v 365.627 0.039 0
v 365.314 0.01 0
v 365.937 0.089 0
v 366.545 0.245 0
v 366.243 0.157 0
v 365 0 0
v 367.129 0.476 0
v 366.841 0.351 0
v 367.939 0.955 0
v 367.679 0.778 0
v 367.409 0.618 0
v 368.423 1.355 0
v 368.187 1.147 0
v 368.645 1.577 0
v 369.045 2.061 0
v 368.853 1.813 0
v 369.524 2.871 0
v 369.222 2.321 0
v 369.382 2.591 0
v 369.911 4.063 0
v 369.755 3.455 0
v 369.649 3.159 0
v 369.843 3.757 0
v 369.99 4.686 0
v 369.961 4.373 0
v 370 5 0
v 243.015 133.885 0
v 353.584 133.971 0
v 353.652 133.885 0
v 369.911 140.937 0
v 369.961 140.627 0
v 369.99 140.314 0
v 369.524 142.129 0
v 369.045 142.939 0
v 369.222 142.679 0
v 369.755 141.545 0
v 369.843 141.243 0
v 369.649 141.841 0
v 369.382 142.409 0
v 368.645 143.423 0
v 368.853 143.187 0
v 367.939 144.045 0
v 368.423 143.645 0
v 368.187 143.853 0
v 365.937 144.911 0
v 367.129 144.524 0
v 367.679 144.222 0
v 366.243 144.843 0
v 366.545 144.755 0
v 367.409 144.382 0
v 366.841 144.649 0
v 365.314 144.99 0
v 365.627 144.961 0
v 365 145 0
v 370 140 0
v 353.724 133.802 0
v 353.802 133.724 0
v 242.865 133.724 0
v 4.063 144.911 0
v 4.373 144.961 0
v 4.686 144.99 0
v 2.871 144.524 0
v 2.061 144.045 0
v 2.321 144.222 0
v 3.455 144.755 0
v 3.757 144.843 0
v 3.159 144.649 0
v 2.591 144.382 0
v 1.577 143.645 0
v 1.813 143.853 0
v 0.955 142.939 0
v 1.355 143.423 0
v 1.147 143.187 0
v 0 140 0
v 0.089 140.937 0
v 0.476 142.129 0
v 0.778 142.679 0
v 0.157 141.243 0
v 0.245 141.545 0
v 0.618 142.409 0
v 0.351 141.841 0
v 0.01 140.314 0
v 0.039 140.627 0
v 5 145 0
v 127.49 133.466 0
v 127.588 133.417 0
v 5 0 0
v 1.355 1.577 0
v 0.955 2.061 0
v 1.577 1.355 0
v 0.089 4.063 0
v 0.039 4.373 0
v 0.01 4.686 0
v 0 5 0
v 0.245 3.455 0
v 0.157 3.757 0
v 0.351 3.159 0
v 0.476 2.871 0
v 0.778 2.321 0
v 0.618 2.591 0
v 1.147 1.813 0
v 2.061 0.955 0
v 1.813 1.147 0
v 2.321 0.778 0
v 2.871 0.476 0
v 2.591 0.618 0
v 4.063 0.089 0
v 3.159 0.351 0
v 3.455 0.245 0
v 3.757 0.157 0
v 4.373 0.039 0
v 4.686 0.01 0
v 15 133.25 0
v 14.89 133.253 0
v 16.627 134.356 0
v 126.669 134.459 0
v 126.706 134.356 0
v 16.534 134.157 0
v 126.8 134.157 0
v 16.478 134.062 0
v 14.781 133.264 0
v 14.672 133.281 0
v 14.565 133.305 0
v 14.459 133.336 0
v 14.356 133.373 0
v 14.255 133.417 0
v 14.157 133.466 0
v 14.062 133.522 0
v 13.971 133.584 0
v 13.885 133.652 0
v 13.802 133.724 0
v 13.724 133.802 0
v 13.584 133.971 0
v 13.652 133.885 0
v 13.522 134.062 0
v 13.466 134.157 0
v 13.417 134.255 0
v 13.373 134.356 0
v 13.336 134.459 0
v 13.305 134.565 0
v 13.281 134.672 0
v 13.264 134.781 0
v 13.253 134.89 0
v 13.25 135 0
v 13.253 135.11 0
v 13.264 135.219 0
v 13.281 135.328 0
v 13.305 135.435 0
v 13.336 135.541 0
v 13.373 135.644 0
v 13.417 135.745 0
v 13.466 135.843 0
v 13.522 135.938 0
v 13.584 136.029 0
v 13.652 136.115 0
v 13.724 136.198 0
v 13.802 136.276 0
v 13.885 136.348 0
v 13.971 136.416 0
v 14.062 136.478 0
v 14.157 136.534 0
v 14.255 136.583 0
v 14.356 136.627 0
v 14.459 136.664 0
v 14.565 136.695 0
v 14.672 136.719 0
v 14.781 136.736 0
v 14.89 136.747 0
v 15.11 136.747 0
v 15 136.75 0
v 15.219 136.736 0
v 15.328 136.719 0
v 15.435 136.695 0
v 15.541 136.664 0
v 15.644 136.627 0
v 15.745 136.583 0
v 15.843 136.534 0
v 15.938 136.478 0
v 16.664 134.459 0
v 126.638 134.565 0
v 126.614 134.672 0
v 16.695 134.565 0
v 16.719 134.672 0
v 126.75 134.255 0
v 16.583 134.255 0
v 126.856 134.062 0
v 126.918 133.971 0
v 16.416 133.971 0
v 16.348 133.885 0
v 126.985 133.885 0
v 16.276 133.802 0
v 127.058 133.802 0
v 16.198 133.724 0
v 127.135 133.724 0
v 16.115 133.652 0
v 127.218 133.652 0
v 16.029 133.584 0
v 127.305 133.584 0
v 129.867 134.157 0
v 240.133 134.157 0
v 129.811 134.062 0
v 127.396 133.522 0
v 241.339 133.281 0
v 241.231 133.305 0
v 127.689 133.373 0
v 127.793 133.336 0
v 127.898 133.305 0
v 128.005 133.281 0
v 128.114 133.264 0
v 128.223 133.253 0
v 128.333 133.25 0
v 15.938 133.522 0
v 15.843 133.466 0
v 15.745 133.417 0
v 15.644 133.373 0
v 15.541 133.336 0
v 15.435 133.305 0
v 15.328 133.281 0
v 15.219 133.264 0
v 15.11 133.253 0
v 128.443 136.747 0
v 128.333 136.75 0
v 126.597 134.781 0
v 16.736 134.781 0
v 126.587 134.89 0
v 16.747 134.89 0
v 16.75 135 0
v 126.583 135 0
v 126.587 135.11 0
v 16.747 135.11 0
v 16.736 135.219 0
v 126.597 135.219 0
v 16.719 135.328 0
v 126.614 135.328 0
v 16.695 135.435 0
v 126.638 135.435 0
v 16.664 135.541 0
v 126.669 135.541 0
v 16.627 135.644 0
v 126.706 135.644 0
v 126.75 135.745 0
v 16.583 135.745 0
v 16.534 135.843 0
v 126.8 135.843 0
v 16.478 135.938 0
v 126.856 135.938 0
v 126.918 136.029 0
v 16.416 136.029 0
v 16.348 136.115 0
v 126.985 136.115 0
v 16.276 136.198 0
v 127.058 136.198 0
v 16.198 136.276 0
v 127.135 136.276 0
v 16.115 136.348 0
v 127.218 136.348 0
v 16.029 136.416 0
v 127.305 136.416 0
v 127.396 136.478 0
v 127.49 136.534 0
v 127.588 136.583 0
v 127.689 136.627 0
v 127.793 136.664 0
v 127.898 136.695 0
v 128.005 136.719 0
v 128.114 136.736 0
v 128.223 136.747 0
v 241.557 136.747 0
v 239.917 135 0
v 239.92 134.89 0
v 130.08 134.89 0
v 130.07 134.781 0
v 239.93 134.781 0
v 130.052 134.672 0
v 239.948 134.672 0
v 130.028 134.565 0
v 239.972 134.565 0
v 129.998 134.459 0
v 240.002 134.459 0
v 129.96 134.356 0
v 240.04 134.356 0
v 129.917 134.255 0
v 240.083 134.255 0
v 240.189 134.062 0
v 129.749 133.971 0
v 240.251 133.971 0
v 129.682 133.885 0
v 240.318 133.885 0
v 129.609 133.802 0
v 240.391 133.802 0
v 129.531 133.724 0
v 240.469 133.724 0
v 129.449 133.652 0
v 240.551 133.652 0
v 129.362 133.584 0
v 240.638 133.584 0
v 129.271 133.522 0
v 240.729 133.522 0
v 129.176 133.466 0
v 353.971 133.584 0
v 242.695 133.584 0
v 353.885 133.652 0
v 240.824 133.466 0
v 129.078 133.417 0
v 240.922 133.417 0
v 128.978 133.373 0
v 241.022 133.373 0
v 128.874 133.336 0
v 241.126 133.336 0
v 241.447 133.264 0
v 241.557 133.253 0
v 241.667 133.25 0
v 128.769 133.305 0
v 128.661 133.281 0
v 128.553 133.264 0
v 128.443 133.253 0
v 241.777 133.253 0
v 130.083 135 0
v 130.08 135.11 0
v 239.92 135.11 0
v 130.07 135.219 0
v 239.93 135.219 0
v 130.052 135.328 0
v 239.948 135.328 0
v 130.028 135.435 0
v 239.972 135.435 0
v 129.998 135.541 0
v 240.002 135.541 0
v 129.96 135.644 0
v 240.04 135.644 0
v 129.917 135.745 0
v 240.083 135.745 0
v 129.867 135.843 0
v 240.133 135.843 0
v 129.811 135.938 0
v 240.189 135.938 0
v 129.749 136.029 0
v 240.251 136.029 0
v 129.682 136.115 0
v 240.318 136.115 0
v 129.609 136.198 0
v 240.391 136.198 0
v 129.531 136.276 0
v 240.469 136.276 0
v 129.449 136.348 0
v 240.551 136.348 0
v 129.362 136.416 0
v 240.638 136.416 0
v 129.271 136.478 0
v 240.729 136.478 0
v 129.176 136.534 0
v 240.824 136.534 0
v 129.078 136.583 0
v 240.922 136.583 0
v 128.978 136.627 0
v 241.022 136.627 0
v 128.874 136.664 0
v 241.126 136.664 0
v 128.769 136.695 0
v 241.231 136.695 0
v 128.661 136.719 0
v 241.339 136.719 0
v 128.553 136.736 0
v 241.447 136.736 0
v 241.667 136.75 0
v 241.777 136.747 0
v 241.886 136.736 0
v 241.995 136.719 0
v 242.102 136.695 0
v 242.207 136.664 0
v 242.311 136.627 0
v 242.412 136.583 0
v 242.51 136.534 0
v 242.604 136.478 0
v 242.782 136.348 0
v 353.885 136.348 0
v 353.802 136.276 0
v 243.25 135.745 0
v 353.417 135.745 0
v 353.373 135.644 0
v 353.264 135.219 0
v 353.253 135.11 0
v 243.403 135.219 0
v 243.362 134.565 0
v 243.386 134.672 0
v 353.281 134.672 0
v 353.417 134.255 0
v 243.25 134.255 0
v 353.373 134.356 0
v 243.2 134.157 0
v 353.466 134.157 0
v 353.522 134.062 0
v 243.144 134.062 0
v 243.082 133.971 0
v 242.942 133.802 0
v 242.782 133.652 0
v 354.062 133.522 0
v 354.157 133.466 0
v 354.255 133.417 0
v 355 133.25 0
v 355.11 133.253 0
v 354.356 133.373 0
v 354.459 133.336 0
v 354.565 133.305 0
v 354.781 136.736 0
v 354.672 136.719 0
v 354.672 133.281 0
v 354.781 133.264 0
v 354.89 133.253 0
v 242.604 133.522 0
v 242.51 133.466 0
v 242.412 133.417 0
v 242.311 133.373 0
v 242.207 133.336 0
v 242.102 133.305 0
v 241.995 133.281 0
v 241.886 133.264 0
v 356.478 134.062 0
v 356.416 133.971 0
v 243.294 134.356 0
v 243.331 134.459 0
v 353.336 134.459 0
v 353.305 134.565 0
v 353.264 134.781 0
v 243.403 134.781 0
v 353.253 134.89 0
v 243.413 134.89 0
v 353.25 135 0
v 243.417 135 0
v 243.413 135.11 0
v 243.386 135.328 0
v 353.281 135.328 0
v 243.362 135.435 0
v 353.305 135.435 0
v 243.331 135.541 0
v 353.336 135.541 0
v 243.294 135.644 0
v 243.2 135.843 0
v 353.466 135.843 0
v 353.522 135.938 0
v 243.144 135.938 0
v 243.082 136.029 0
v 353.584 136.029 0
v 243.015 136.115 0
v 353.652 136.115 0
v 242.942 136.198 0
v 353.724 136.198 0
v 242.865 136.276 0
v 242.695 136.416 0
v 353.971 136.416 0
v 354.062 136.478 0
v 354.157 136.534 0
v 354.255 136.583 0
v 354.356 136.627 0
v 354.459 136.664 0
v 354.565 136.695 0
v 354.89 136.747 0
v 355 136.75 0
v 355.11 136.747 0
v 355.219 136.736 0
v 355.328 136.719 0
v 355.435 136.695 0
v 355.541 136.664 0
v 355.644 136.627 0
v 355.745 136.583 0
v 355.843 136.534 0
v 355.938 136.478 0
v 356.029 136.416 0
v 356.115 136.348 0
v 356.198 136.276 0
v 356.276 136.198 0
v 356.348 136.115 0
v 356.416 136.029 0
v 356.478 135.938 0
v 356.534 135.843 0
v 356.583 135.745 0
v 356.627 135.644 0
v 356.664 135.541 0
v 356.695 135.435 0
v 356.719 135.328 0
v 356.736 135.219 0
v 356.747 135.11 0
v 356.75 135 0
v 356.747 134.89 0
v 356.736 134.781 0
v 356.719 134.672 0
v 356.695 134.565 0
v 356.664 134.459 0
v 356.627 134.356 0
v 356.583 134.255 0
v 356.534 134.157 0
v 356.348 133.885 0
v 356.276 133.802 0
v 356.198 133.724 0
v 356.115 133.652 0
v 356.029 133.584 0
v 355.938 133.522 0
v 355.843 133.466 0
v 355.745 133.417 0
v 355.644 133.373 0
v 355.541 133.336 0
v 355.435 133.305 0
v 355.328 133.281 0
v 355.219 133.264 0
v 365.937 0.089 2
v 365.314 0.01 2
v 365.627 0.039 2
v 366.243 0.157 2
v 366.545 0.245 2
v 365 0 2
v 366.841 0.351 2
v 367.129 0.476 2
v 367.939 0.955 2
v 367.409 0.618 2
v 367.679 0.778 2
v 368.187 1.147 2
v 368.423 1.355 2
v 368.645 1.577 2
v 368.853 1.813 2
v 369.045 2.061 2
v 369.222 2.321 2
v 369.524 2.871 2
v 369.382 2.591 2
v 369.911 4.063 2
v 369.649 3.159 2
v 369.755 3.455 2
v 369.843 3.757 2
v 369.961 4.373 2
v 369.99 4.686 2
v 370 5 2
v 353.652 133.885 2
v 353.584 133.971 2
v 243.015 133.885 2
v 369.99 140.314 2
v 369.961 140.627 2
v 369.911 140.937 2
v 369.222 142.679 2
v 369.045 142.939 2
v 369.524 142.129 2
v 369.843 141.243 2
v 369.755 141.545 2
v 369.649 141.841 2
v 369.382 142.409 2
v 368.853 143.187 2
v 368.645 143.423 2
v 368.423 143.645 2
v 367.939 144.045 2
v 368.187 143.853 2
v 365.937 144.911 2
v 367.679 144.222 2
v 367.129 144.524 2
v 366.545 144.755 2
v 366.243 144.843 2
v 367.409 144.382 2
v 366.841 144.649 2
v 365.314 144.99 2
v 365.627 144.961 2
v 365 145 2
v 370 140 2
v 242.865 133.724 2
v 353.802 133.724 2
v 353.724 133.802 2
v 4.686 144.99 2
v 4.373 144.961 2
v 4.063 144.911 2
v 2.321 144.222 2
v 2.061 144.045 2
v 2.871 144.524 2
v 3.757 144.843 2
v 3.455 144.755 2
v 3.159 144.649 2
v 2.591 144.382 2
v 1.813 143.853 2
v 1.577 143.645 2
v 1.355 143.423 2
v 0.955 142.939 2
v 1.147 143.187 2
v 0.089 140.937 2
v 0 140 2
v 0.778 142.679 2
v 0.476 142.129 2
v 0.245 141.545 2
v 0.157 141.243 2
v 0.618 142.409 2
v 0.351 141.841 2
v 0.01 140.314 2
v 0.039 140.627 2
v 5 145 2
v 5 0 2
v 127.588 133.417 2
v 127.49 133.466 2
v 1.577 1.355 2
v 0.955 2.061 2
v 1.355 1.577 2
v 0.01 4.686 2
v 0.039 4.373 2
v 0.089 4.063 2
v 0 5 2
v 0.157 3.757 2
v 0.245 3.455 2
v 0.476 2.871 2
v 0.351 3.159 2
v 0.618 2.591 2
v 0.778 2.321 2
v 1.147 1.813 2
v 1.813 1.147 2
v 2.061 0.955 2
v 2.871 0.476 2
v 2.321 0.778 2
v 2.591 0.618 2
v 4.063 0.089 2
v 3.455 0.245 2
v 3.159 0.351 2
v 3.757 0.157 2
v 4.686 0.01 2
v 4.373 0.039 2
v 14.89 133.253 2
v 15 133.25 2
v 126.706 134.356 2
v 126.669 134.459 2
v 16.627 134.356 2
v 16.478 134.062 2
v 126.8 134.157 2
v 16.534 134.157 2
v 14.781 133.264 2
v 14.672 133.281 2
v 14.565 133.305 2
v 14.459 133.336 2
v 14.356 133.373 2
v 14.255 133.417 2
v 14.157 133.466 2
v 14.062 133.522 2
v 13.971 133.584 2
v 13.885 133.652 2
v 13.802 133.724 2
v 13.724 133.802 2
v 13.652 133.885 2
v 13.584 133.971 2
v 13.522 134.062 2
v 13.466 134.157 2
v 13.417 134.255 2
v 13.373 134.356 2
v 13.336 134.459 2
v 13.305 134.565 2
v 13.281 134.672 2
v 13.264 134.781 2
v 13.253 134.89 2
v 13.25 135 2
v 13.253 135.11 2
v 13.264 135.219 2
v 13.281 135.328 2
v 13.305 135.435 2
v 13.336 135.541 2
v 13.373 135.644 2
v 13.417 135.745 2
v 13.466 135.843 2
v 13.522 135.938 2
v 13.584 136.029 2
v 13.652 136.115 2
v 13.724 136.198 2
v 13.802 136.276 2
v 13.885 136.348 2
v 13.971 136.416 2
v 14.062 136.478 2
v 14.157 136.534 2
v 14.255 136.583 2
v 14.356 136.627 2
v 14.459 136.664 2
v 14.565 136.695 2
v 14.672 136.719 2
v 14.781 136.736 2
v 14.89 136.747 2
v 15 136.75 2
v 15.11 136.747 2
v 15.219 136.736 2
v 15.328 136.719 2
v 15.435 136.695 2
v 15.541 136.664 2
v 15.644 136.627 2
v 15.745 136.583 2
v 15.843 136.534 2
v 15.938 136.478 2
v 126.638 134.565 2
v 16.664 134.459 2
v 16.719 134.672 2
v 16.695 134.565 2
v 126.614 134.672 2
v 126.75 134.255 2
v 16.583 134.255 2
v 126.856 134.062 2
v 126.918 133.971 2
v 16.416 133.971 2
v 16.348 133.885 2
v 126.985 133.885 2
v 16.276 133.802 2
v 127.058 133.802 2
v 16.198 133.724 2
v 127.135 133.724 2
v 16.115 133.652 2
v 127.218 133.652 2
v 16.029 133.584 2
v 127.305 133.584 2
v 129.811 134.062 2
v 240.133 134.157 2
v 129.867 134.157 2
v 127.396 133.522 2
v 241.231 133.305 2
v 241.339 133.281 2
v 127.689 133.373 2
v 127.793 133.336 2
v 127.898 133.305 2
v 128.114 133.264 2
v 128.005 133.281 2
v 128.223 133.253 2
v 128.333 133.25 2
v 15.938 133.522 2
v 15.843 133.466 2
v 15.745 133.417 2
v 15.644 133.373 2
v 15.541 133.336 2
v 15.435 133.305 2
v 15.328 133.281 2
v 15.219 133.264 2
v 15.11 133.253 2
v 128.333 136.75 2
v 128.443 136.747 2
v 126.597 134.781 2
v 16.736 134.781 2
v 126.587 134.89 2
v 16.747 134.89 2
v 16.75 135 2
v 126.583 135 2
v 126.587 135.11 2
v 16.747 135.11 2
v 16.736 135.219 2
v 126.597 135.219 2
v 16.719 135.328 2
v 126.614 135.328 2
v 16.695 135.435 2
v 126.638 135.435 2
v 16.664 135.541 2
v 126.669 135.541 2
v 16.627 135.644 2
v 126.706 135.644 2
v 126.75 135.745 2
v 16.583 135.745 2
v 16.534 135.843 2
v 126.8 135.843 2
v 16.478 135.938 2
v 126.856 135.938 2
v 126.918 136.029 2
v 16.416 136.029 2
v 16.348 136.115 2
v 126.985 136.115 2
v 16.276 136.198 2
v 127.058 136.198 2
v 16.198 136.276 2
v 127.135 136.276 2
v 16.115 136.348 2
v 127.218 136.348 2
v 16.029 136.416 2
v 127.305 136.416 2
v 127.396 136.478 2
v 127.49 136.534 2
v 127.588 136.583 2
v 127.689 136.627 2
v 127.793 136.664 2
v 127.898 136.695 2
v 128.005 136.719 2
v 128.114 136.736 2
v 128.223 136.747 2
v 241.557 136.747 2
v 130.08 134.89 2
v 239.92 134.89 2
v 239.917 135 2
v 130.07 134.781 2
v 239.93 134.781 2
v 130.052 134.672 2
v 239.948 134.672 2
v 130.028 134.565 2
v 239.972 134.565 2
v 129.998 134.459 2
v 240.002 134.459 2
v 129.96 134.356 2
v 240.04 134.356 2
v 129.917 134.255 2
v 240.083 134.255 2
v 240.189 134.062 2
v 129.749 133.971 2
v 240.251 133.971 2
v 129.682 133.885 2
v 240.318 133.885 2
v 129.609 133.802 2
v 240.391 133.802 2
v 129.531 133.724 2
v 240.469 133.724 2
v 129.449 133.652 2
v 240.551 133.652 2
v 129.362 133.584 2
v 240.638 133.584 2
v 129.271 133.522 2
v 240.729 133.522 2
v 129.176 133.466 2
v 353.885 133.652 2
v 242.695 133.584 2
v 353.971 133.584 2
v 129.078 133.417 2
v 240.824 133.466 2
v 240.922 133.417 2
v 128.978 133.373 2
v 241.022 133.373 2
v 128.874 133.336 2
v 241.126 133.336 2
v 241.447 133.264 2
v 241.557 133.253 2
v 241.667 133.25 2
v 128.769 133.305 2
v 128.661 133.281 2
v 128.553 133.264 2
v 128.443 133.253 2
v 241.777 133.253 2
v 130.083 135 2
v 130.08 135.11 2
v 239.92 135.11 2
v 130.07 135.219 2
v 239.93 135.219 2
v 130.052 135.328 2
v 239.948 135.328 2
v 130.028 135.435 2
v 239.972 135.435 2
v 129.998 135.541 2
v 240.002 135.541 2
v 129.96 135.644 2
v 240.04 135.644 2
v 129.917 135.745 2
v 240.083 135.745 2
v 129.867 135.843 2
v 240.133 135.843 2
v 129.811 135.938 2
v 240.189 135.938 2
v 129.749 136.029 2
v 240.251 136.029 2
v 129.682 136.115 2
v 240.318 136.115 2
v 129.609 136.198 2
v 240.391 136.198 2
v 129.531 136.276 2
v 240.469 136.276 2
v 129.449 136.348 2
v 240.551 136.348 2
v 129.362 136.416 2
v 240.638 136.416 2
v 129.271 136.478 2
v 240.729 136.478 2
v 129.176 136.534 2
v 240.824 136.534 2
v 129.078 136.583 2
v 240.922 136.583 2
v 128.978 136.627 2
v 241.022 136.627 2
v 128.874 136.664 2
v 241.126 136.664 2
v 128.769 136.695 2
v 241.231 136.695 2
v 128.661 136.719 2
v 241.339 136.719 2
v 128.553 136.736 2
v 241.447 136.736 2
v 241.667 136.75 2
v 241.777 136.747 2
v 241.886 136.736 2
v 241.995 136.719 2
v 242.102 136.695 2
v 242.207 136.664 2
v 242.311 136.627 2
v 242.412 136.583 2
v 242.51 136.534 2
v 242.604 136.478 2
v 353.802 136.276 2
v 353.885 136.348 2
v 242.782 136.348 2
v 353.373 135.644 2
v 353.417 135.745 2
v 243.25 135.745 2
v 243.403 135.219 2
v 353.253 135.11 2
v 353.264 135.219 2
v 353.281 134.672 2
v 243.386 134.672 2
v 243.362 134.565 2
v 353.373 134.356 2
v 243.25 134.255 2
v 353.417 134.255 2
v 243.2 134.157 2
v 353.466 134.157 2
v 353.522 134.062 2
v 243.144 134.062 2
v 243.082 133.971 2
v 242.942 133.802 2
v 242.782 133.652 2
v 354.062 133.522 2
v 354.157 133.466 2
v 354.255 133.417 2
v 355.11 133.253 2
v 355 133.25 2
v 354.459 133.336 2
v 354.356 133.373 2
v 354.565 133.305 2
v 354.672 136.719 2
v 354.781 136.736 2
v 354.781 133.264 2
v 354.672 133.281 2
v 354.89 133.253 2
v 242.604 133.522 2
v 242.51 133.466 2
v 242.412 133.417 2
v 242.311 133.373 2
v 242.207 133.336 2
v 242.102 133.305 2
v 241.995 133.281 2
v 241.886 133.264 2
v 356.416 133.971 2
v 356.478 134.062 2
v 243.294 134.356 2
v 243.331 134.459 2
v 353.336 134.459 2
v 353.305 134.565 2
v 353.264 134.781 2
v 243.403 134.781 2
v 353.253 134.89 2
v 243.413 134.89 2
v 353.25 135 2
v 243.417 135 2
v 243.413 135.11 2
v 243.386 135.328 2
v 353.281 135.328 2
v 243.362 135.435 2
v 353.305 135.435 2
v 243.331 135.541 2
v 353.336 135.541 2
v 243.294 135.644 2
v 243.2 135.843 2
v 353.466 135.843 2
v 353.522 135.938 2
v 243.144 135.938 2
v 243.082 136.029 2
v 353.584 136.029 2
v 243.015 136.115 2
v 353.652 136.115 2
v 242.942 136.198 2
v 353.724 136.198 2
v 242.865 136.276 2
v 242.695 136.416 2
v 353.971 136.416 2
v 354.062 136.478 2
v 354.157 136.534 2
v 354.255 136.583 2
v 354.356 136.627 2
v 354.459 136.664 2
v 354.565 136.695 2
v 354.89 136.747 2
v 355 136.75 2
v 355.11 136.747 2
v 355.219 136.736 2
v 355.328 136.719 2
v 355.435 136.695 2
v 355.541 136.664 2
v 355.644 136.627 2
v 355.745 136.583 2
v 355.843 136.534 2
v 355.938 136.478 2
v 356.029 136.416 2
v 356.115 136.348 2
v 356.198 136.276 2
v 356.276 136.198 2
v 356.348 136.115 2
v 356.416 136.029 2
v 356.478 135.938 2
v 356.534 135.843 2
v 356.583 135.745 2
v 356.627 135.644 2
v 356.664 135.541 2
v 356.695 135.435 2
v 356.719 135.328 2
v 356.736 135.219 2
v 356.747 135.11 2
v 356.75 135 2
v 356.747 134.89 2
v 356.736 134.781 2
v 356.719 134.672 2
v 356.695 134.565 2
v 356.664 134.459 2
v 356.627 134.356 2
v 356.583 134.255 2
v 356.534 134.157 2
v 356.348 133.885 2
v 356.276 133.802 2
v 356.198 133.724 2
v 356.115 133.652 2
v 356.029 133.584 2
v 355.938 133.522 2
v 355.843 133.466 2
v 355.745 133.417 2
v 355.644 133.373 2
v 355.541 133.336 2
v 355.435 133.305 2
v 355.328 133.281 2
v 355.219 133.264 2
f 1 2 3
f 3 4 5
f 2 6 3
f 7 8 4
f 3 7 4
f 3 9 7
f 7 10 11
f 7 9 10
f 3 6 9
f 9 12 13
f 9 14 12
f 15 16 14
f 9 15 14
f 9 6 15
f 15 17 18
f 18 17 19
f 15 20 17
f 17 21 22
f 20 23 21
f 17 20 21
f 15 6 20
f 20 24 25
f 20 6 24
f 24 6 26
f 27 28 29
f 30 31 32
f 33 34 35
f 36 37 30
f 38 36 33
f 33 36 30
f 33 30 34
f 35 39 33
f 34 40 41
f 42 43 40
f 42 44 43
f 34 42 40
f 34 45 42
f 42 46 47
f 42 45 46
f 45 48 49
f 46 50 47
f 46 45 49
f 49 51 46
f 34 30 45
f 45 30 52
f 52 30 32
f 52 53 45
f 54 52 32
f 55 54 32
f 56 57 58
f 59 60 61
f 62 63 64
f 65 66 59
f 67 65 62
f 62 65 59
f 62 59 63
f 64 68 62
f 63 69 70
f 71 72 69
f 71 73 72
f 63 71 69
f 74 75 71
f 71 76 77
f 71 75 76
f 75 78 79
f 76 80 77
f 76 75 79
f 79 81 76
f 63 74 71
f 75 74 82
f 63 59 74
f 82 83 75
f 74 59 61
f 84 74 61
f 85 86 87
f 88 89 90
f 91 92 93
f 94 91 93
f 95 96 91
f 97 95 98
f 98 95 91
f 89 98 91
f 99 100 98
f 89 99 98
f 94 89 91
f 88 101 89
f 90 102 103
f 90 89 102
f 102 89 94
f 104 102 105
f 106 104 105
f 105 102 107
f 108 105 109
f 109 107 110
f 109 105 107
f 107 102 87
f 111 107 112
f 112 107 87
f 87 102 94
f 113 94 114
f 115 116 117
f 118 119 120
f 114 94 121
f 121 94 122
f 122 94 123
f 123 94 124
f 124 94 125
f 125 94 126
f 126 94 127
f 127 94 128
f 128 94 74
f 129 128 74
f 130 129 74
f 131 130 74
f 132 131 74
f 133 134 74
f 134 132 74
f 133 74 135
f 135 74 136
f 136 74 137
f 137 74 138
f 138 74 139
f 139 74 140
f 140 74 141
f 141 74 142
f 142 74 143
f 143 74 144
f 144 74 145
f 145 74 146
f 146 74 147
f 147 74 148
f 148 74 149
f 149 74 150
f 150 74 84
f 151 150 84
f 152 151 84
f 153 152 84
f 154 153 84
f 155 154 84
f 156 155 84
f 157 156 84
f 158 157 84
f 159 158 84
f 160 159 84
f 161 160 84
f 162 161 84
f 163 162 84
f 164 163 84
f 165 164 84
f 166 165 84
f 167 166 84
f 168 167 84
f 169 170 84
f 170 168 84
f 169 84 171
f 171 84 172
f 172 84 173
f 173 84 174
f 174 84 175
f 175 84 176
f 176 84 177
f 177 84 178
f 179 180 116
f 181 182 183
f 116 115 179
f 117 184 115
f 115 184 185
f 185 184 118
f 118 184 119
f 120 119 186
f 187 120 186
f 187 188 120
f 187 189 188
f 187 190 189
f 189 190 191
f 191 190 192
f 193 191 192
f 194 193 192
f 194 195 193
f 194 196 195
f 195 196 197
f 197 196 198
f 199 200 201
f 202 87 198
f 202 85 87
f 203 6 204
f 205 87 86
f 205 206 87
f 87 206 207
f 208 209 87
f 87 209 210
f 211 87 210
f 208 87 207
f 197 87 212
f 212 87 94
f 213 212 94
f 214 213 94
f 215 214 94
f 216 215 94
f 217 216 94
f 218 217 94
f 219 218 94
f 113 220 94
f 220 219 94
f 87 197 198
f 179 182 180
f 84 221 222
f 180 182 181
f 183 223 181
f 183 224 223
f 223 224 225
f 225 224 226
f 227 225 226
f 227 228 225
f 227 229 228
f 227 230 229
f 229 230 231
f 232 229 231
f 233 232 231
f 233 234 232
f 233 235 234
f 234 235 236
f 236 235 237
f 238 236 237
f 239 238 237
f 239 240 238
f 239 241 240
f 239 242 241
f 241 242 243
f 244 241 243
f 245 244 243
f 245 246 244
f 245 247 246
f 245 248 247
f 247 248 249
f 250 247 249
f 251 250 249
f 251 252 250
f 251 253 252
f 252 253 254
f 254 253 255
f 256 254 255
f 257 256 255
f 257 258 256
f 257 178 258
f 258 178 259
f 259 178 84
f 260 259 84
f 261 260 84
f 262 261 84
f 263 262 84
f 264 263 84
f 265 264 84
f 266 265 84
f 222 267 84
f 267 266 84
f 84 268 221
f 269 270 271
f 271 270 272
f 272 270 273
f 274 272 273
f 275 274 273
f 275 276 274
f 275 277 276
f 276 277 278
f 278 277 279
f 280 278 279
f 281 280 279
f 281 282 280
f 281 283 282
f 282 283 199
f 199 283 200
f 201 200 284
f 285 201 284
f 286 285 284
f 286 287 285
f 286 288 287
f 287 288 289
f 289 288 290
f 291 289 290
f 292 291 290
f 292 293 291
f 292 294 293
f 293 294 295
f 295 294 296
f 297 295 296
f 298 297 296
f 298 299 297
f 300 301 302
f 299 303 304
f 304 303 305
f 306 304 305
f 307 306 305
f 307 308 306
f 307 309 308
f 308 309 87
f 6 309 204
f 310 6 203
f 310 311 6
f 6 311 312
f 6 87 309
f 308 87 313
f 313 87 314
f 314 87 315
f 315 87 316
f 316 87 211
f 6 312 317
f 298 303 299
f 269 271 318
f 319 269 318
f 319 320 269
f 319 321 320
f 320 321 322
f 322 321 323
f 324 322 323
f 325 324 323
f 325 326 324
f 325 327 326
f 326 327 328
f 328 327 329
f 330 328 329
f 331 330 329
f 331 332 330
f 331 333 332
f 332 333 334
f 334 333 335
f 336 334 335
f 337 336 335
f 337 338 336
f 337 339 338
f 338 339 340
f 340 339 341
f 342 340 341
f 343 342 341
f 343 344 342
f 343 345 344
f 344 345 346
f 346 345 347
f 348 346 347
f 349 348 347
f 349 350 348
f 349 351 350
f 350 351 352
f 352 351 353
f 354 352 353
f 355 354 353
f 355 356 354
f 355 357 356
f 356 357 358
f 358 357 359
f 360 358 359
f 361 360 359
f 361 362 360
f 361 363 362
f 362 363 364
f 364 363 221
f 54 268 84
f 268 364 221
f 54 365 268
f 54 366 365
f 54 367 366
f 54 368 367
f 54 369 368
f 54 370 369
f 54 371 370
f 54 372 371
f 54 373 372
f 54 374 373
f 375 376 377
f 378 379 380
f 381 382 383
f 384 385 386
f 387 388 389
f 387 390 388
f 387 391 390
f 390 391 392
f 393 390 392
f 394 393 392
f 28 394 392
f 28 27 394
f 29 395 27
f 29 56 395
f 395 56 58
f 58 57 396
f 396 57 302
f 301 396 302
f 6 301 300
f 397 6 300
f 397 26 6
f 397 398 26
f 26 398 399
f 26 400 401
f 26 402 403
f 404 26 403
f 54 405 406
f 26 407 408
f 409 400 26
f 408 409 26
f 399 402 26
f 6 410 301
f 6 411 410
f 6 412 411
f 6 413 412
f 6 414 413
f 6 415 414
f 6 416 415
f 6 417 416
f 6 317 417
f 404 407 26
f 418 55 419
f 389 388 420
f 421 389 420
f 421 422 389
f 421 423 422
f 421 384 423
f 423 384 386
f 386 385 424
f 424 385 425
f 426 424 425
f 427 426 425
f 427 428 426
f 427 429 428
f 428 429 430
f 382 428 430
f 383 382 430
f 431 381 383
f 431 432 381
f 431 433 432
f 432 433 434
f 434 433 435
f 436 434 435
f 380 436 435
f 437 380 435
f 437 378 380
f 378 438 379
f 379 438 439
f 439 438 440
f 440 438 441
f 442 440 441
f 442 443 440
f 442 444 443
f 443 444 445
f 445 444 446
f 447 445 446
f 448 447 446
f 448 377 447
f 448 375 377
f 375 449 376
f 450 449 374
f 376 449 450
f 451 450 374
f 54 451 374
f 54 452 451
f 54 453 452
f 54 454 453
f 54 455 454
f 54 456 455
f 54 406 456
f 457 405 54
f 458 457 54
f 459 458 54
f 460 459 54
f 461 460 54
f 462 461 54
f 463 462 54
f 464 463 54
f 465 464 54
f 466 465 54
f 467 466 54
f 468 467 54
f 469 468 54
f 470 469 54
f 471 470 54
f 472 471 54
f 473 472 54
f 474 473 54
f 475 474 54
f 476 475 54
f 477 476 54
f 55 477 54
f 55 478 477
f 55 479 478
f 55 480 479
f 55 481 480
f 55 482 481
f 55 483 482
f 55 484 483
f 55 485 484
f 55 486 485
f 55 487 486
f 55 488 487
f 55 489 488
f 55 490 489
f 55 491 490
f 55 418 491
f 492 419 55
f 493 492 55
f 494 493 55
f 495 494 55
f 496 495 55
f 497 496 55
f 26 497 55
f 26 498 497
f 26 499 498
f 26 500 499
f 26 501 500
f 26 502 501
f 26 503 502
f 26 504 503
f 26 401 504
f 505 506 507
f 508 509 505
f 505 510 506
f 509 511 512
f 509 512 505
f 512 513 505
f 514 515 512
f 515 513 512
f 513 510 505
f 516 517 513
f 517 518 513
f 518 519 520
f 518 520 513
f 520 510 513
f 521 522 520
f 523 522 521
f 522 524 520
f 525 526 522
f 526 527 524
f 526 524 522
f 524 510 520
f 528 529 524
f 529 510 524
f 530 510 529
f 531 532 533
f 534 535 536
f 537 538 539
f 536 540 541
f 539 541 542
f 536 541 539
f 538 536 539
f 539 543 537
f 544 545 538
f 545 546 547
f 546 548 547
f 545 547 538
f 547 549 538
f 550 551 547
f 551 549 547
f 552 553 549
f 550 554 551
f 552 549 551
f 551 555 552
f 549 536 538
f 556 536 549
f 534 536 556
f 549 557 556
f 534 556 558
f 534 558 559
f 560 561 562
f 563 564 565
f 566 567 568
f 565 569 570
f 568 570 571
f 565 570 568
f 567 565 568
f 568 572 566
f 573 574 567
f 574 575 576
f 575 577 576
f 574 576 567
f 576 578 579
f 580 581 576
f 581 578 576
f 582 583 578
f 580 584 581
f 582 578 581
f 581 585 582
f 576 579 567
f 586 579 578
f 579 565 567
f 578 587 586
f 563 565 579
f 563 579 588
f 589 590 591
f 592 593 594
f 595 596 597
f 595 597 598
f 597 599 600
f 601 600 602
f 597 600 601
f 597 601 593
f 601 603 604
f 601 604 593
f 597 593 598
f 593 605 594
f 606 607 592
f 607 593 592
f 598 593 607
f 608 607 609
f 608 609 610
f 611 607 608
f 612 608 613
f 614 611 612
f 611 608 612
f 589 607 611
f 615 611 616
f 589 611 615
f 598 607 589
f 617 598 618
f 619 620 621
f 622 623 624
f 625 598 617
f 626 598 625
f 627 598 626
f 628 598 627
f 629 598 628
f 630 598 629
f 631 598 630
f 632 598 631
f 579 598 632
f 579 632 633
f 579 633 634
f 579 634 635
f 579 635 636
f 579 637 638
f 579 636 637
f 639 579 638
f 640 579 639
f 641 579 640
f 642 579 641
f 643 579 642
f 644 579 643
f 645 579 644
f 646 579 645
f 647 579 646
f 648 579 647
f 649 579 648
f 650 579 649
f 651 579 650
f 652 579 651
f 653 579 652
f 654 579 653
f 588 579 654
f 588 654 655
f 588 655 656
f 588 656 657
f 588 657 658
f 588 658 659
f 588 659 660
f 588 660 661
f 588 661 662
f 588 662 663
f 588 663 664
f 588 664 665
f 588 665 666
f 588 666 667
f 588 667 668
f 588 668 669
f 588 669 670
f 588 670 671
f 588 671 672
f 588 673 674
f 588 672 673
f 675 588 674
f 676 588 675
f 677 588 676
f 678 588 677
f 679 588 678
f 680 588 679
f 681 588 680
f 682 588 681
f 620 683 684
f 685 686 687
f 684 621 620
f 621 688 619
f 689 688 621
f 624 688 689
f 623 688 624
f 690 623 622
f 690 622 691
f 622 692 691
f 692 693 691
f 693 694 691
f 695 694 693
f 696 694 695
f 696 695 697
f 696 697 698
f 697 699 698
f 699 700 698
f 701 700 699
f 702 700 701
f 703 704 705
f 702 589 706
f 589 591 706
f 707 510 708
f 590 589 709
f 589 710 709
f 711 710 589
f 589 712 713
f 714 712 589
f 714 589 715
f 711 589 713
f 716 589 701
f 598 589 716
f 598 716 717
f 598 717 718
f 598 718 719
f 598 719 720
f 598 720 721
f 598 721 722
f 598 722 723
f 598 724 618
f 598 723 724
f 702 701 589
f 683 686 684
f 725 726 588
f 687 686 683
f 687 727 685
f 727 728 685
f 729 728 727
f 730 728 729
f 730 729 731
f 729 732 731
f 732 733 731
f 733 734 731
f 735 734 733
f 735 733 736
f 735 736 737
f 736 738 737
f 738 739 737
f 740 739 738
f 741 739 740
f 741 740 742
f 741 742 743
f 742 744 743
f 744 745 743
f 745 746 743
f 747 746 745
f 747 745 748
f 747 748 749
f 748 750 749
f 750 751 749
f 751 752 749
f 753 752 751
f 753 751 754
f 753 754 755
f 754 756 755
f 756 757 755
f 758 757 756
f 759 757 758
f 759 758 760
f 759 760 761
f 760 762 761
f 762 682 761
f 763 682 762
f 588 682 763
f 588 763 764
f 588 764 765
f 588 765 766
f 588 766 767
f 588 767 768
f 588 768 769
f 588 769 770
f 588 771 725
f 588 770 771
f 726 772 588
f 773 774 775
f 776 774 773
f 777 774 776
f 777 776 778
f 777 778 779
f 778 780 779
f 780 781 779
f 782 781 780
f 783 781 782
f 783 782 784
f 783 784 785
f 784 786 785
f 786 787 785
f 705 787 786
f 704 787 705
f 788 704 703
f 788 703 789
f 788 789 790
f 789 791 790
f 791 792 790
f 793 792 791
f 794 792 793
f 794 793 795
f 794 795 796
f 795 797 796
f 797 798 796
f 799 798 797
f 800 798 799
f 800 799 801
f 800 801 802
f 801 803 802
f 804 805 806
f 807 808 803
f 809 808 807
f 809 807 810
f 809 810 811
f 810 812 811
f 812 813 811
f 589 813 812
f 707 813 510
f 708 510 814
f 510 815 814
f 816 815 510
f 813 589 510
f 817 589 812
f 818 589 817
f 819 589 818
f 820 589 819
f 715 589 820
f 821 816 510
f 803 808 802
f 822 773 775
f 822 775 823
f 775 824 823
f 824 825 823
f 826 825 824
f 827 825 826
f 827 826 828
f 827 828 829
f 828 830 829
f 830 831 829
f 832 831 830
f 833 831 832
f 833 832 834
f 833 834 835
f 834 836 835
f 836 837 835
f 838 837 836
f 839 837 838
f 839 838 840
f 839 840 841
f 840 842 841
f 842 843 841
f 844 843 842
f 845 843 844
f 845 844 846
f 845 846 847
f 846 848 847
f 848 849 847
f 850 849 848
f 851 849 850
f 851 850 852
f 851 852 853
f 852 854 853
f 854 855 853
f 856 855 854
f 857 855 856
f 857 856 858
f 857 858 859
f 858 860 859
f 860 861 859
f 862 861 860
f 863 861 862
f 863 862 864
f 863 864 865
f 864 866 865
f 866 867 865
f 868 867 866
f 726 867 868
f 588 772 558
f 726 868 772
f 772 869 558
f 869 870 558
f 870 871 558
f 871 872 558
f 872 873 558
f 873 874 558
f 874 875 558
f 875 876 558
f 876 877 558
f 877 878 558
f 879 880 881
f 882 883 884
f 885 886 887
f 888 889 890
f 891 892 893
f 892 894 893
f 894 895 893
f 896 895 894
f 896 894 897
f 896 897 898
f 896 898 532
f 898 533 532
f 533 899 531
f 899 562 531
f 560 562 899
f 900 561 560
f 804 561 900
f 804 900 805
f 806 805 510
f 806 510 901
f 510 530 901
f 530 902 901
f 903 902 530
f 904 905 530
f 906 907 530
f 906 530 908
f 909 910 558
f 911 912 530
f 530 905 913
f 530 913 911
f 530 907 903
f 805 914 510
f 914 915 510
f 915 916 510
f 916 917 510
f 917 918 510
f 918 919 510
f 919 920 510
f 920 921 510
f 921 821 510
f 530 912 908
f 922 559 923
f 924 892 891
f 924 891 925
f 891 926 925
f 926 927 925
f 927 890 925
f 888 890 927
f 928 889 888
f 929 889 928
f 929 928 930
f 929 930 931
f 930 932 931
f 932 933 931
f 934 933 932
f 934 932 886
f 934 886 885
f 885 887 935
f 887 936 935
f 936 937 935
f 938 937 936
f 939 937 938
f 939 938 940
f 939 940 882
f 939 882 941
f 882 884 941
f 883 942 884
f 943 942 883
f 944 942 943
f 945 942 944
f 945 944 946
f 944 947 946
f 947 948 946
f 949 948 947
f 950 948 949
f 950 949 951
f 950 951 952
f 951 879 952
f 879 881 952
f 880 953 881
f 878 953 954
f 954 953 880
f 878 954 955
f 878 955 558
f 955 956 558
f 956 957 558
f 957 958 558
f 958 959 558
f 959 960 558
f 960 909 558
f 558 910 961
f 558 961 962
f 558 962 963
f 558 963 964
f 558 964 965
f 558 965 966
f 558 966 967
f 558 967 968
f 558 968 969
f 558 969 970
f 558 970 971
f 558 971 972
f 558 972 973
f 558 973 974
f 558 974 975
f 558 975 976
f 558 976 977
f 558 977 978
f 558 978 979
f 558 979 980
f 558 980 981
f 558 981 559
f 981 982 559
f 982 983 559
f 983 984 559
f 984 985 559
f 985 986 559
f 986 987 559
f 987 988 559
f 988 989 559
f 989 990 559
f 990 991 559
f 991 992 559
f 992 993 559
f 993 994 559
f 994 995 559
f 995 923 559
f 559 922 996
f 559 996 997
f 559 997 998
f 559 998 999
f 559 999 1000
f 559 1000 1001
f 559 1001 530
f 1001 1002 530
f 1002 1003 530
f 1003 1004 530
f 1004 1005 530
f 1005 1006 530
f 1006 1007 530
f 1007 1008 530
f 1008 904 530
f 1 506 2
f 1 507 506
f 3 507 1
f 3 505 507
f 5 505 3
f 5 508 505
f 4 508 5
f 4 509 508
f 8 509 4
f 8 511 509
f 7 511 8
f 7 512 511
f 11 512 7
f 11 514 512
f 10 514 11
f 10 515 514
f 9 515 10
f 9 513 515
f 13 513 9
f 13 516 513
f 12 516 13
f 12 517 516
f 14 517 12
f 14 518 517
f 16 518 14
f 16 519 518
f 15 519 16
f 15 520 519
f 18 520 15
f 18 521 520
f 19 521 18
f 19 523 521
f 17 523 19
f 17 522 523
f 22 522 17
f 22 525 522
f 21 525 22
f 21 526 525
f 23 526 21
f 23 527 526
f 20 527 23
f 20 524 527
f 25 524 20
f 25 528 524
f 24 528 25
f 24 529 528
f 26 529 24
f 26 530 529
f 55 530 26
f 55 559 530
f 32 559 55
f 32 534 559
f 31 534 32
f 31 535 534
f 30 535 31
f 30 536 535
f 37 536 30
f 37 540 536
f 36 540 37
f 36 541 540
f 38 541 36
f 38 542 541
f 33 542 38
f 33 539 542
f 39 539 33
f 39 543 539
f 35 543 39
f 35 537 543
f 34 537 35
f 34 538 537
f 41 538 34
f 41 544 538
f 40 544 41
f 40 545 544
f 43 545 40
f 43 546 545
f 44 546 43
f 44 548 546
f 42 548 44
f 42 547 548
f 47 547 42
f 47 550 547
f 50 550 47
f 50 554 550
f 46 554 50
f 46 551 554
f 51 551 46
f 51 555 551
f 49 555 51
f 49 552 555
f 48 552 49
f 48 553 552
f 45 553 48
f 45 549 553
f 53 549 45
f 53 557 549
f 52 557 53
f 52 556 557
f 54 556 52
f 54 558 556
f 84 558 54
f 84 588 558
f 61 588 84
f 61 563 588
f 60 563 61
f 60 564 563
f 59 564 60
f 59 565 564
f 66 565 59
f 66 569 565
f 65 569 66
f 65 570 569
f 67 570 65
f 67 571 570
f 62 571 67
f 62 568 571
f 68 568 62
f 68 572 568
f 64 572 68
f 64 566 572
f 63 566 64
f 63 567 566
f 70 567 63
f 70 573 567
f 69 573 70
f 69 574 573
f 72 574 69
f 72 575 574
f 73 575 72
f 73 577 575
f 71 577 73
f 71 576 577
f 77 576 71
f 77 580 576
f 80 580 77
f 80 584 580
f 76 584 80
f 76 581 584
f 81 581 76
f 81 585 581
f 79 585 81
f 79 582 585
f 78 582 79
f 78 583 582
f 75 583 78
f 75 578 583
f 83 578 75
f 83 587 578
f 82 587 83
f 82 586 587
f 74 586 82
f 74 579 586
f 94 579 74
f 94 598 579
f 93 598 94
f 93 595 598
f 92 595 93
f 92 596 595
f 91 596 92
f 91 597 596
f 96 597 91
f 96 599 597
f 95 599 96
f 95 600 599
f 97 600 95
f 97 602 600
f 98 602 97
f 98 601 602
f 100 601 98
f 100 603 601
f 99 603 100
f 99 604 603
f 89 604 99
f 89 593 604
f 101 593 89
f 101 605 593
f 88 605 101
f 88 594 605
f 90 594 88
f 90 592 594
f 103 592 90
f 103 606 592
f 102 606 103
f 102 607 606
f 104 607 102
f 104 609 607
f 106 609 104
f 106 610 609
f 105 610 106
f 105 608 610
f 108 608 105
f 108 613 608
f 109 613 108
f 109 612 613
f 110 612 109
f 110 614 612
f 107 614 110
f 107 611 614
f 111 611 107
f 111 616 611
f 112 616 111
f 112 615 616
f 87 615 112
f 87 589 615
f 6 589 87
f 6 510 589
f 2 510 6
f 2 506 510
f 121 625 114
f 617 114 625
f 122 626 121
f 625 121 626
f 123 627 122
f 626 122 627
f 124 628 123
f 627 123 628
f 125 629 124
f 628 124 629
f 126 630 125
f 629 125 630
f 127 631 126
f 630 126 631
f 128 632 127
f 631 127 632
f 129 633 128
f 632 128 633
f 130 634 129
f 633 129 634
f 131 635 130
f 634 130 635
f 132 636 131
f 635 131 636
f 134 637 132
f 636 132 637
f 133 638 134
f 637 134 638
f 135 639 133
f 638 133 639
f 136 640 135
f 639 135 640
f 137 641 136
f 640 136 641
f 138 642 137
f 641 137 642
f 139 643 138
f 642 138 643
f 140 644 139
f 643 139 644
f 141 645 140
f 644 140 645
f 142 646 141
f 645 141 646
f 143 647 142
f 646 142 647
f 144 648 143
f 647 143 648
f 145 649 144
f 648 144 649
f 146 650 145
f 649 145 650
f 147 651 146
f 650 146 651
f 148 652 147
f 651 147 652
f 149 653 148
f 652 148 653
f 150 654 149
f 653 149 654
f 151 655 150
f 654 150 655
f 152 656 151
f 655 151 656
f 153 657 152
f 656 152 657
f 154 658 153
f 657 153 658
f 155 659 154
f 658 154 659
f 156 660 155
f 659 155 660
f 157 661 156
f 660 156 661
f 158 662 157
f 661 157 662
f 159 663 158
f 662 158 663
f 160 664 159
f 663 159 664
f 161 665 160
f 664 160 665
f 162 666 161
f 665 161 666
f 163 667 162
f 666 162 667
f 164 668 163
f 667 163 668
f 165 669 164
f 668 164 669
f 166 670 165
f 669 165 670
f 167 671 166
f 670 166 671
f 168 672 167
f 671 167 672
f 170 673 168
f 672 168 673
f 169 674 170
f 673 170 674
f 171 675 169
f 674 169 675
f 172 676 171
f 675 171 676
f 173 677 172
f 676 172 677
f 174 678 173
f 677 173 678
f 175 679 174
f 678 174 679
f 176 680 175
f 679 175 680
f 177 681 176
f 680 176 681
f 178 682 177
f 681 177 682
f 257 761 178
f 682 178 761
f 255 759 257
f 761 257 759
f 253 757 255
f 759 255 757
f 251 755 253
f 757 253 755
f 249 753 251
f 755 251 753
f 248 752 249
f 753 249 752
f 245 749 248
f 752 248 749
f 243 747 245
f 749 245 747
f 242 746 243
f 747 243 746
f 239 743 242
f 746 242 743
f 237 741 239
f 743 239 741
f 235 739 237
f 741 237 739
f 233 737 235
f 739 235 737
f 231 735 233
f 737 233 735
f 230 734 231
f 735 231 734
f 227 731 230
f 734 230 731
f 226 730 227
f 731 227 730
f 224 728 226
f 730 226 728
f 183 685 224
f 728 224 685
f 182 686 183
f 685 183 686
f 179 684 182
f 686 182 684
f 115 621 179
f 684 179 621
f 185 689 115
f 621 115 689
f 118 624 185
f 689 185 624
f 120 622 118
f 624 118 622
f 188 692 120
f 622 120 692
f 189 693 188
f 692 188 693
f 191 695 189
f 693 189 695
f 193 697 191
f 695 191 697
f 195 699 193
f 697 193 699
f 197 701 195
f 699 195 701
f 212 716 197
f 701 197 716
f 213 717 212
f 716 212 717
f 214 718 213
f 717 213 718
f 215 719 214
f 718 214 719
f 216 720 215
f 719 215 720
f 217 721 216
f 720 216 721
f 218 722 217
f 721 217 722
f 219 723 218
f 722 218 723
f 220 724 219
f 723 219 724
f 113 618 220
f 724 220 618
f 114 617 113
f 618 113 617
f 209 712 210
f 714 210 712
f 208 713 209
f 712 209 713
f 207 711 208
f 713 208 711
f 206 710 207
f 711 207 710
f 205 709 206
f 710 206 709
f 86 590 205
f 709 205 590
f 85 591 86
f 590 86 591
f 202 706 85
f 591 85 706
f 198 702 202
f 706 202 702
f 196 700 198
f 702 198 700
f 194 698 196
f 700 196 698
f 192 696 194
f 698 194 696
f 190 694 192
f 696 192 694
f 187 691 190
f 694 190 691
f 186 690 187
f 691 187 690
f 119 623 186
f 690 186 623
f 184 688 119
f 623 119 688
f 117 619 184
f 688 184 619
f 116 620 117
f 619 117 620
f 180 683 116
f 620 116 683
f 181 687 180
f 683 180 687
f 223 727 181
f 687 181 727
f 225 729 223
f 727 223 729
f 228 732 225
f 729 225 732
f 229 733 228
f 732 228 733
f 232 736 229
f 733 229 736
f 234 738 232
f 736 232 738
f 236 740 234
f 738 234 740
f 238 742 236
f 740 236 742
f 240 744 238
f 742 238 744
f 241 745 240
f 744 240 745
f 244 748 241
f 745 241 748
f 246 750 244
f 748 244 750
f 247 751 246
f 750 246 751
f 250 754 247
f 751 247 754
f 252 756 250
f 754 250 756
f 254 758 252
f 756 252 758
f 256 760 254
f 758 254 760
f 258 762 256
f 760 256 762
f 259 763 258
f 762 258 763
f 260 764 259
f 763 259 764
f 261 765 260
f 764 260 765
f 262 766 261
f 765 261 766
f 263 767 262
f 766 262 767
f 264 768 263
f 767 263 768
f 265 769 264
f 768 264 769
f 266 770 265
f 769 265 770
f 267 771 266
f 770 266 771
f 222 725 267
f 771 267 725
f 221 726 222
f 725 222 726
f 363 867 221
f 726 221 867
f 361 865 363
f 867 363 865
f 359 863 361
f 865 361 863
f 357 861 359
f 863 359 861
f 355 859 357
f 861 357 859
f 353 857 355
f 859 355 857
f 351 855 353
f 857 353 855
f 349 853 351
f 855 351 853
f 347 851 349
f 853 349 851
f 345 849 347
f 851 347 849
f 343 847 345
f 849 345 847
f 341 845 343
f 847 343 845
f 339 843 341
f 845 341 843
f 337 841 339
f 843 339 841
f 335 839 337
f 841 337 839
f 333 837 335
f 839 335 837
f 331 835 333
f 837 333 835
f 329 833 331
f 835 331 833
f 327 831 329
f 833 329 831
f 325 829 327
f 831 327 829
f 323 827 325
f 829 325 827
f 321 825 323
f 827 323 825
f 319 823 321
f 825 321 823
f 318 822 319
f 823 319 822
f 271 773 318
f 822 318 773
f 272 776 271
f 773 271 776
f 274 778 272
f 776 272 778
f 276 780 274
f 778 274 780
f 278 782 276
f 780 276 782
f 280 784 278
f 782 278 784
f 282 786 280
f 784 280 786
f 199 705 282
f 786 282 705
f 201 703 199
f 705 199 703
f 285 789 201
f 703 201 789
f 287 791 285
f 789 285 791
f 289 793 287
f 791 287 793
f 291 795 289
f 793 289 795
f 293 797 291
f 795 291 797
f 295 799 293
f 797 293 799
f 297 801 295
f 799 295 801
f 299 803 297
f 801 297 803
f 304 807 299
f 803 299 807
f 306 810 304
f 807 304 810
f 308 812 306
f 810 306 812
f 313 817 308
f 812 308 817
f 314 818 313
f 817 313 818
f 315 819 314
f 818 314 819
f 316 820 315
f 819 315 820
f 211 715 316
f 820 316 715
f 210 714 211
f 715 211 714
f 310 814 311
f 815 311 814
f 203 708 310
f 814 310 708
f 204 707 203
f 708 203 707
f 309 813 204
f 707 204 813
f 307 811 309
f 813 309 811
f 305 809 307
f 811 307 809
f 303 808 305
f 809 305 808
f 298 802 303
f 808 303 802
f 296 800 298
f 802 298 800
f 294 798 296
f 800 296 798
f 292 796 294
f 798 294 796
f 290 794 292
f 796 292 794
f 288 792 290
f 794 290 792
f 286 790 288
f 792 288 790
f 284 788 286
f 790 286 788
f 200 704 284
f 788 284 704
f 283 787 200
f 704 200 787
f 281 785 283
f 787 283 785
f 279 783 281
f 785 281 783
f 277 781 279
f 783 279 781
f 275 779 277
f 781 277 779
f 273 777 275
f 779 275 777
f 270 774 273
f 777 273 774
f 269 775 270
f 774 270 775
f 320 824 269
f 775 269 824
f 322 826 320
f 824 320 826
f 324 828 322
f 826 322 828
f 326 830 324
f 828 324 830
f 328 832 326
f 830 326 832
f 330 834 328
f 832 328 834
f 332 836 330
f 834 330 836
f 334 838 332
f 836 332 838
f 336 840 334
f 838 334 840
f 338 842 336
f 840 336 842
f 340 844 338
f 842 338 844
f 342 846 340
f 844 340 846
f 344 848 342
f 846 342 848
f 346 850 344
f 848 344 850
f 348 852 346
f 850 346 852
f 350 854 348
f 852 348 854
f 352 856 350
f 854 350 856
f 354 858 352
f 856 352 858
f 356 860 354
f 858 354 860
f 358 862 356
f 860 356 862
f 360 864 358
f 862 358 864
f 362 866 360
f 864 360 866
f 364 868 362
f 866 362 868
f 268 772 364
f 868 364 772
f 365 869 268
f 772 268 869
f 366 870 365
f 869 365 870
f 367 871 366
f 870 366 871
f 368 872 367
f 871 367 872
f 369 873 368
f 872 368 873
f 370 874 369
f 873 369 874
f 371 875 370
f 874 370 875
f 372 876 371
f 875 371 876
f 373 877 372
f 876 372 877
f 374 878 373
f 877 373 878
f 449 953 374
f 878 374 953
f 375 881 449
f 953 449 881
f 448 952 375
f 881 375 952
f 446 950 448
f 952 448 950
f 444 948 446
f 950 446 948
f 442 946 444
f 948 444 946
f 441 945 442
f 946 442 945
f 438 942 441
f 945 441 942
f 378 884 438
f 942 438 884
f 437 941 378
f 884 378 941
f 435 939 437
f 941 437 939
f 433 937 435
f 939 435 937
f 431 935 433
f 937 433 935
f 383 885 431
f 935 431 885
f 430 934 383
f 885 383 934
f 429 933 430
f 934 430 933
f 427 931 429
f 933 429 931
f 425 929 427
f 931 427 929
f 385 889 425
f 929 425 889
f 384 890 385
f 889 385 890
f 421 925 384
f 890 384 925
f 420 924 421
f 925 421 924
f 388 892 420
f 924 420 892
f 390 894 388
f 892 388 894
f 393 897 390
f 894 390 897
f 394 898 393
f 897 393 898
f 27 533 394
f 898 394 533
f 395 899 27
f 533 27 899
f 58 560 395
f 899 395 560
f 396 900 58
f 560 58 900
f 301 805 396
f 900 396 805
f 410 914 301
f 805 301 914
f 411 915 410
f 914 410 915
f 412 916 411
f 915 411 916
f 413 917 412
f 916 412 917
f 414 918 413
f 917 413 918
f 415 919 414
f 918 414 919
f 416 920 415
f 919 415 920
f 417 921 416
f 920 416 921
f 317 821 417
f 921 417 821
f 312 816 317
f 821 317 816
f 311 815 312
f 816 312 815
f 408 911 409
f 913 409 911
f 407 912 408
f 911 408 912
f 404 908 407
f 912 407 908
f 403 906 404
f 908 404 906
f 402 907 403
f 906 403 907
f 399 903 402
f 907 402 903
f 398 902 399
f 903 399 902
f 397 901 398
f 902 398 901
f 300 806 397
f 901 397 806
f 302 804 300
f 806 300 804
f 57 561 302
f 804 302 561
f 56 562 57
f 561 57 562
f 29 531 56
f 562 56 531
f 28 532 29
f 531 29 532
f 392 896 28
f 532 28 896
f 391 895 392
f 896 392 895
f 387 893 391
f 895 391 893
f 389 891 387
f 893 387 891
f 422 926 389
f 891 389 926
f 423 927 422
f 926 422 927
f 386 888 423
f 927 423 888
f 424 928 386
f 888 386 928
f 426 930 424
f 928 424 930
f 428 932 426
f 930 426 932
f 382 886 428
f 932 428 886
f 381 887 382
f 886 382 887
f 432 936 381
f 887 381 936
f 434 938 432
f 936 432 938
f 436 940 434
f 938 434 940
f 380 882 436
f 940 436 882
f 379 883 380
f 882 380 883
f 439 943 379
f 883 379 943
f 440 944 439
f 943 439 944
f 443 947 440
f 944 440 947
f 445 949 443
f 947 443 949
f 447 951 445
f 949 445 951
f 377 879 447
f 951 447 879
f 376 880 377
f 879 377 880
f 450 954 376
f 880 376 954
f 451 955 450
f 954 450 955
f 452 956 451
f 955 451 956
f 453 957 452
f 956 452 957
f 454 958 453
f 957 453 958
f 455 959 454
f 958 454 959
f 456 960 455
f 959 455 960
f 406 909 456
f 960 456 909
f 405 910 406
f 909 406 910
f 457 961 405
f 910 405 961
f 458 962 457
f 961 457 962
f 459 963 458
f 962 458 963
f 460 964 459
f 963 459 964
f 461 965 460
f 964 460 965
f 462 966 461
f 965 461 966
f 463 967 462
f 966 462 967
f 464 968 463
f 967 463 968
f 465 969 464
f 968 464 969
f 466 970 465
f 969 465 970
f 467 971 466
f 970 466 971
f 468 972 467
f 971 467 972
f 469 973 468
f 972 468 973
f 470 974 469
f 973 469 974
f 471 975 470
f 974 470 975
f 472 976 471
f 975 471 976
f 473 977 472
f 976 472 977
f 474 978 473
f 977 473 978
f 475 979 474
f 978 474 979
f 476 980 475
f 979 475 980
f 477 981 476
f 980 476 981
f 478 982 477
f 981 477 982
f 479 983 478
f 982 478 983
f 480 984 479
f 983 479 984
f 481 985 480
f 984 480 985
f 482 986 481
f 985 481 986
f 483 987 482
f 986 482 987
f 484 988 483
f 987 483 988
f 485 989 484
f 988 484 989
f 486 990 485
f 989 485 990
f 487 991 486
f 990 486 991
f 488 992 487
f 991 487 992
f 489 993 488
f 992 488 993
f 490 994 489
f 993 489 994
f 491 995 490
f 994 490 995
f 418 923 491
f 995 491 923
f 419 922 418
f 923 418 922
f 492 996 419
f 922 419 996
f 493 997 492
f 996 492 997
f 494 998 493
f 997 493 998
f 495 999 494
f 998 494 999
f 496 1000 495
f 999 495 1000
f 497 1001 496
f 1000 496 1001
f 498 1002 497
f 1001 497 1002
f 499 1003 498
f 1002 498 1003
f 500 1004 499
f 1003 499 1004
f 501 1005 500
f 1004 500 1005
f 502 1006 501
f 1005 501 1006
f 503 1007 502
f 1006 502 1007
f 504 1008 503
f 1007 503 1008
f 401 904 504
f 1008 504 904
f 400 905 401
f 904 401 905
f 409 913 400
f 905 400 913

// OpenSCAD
/*
 * 2mm Foot Plate x1
 * Extruded from provided DXF file.
 * 
 * Dimensions: 370mm x 145mm
 * Material Thickness: 2mm
 * Corner Radius: 5mm
 */

// Set curve resolution for smooth circles and arcs
$fn = 100;

// Material thickness defined by the filename
thickness = 2;

module outer_profile() {
    // The outer boundary is a rounded rectangle.
    // Reconstructed using the centers of the 4 corner arcs (Radius 5)
    // Extents match DXF boundaries: X [0 to 370], Y [0 to 145]
    hull() {
        // Bottom-left corner (Arc 81)
        translate([5, 5]) circle(r=5);
        
        // Bottom-right corner (Arc 80)
        translate([365, 5]) circle(r=5);
        
        // Top-right corner (Arc 7F)
        translate([365, 140]) circle(r=5);
        
        // Top-left corner (Arc 7E)
        translate([5, 140]) circle(r=5);
    }
}

module holes() {
    // Four circular cuts located near the top edge
    // All holes have a radius of 1.75mm (Diameter 3.5mm)
    
    // Hole 1 (Circle 76)
    translate([15.0, 135.0]) circle(r=1.75);
    
    // Hole 2 (Circle 73)
    translate([128.3333333333, 135.0]) circle(r=1.75);
    
    // Hole 3 (Circle 75)
    translate([241.6666666667, 135.0]) circle(r=1.75);
    
    // Hole 4 (Circle 74)
    translate([355.0, 135.0]) circle(r=1.75);
}

module foot_plate_2d() {
    // Subtract internal holes from the outer profile
    difference() {
        outer_profile();
        holes();
    }
}

// Extrude the finished 2D profile to the specified 2mm thickness
linear_extrude(height = thickness) {
    foot_plate_2d();
}
